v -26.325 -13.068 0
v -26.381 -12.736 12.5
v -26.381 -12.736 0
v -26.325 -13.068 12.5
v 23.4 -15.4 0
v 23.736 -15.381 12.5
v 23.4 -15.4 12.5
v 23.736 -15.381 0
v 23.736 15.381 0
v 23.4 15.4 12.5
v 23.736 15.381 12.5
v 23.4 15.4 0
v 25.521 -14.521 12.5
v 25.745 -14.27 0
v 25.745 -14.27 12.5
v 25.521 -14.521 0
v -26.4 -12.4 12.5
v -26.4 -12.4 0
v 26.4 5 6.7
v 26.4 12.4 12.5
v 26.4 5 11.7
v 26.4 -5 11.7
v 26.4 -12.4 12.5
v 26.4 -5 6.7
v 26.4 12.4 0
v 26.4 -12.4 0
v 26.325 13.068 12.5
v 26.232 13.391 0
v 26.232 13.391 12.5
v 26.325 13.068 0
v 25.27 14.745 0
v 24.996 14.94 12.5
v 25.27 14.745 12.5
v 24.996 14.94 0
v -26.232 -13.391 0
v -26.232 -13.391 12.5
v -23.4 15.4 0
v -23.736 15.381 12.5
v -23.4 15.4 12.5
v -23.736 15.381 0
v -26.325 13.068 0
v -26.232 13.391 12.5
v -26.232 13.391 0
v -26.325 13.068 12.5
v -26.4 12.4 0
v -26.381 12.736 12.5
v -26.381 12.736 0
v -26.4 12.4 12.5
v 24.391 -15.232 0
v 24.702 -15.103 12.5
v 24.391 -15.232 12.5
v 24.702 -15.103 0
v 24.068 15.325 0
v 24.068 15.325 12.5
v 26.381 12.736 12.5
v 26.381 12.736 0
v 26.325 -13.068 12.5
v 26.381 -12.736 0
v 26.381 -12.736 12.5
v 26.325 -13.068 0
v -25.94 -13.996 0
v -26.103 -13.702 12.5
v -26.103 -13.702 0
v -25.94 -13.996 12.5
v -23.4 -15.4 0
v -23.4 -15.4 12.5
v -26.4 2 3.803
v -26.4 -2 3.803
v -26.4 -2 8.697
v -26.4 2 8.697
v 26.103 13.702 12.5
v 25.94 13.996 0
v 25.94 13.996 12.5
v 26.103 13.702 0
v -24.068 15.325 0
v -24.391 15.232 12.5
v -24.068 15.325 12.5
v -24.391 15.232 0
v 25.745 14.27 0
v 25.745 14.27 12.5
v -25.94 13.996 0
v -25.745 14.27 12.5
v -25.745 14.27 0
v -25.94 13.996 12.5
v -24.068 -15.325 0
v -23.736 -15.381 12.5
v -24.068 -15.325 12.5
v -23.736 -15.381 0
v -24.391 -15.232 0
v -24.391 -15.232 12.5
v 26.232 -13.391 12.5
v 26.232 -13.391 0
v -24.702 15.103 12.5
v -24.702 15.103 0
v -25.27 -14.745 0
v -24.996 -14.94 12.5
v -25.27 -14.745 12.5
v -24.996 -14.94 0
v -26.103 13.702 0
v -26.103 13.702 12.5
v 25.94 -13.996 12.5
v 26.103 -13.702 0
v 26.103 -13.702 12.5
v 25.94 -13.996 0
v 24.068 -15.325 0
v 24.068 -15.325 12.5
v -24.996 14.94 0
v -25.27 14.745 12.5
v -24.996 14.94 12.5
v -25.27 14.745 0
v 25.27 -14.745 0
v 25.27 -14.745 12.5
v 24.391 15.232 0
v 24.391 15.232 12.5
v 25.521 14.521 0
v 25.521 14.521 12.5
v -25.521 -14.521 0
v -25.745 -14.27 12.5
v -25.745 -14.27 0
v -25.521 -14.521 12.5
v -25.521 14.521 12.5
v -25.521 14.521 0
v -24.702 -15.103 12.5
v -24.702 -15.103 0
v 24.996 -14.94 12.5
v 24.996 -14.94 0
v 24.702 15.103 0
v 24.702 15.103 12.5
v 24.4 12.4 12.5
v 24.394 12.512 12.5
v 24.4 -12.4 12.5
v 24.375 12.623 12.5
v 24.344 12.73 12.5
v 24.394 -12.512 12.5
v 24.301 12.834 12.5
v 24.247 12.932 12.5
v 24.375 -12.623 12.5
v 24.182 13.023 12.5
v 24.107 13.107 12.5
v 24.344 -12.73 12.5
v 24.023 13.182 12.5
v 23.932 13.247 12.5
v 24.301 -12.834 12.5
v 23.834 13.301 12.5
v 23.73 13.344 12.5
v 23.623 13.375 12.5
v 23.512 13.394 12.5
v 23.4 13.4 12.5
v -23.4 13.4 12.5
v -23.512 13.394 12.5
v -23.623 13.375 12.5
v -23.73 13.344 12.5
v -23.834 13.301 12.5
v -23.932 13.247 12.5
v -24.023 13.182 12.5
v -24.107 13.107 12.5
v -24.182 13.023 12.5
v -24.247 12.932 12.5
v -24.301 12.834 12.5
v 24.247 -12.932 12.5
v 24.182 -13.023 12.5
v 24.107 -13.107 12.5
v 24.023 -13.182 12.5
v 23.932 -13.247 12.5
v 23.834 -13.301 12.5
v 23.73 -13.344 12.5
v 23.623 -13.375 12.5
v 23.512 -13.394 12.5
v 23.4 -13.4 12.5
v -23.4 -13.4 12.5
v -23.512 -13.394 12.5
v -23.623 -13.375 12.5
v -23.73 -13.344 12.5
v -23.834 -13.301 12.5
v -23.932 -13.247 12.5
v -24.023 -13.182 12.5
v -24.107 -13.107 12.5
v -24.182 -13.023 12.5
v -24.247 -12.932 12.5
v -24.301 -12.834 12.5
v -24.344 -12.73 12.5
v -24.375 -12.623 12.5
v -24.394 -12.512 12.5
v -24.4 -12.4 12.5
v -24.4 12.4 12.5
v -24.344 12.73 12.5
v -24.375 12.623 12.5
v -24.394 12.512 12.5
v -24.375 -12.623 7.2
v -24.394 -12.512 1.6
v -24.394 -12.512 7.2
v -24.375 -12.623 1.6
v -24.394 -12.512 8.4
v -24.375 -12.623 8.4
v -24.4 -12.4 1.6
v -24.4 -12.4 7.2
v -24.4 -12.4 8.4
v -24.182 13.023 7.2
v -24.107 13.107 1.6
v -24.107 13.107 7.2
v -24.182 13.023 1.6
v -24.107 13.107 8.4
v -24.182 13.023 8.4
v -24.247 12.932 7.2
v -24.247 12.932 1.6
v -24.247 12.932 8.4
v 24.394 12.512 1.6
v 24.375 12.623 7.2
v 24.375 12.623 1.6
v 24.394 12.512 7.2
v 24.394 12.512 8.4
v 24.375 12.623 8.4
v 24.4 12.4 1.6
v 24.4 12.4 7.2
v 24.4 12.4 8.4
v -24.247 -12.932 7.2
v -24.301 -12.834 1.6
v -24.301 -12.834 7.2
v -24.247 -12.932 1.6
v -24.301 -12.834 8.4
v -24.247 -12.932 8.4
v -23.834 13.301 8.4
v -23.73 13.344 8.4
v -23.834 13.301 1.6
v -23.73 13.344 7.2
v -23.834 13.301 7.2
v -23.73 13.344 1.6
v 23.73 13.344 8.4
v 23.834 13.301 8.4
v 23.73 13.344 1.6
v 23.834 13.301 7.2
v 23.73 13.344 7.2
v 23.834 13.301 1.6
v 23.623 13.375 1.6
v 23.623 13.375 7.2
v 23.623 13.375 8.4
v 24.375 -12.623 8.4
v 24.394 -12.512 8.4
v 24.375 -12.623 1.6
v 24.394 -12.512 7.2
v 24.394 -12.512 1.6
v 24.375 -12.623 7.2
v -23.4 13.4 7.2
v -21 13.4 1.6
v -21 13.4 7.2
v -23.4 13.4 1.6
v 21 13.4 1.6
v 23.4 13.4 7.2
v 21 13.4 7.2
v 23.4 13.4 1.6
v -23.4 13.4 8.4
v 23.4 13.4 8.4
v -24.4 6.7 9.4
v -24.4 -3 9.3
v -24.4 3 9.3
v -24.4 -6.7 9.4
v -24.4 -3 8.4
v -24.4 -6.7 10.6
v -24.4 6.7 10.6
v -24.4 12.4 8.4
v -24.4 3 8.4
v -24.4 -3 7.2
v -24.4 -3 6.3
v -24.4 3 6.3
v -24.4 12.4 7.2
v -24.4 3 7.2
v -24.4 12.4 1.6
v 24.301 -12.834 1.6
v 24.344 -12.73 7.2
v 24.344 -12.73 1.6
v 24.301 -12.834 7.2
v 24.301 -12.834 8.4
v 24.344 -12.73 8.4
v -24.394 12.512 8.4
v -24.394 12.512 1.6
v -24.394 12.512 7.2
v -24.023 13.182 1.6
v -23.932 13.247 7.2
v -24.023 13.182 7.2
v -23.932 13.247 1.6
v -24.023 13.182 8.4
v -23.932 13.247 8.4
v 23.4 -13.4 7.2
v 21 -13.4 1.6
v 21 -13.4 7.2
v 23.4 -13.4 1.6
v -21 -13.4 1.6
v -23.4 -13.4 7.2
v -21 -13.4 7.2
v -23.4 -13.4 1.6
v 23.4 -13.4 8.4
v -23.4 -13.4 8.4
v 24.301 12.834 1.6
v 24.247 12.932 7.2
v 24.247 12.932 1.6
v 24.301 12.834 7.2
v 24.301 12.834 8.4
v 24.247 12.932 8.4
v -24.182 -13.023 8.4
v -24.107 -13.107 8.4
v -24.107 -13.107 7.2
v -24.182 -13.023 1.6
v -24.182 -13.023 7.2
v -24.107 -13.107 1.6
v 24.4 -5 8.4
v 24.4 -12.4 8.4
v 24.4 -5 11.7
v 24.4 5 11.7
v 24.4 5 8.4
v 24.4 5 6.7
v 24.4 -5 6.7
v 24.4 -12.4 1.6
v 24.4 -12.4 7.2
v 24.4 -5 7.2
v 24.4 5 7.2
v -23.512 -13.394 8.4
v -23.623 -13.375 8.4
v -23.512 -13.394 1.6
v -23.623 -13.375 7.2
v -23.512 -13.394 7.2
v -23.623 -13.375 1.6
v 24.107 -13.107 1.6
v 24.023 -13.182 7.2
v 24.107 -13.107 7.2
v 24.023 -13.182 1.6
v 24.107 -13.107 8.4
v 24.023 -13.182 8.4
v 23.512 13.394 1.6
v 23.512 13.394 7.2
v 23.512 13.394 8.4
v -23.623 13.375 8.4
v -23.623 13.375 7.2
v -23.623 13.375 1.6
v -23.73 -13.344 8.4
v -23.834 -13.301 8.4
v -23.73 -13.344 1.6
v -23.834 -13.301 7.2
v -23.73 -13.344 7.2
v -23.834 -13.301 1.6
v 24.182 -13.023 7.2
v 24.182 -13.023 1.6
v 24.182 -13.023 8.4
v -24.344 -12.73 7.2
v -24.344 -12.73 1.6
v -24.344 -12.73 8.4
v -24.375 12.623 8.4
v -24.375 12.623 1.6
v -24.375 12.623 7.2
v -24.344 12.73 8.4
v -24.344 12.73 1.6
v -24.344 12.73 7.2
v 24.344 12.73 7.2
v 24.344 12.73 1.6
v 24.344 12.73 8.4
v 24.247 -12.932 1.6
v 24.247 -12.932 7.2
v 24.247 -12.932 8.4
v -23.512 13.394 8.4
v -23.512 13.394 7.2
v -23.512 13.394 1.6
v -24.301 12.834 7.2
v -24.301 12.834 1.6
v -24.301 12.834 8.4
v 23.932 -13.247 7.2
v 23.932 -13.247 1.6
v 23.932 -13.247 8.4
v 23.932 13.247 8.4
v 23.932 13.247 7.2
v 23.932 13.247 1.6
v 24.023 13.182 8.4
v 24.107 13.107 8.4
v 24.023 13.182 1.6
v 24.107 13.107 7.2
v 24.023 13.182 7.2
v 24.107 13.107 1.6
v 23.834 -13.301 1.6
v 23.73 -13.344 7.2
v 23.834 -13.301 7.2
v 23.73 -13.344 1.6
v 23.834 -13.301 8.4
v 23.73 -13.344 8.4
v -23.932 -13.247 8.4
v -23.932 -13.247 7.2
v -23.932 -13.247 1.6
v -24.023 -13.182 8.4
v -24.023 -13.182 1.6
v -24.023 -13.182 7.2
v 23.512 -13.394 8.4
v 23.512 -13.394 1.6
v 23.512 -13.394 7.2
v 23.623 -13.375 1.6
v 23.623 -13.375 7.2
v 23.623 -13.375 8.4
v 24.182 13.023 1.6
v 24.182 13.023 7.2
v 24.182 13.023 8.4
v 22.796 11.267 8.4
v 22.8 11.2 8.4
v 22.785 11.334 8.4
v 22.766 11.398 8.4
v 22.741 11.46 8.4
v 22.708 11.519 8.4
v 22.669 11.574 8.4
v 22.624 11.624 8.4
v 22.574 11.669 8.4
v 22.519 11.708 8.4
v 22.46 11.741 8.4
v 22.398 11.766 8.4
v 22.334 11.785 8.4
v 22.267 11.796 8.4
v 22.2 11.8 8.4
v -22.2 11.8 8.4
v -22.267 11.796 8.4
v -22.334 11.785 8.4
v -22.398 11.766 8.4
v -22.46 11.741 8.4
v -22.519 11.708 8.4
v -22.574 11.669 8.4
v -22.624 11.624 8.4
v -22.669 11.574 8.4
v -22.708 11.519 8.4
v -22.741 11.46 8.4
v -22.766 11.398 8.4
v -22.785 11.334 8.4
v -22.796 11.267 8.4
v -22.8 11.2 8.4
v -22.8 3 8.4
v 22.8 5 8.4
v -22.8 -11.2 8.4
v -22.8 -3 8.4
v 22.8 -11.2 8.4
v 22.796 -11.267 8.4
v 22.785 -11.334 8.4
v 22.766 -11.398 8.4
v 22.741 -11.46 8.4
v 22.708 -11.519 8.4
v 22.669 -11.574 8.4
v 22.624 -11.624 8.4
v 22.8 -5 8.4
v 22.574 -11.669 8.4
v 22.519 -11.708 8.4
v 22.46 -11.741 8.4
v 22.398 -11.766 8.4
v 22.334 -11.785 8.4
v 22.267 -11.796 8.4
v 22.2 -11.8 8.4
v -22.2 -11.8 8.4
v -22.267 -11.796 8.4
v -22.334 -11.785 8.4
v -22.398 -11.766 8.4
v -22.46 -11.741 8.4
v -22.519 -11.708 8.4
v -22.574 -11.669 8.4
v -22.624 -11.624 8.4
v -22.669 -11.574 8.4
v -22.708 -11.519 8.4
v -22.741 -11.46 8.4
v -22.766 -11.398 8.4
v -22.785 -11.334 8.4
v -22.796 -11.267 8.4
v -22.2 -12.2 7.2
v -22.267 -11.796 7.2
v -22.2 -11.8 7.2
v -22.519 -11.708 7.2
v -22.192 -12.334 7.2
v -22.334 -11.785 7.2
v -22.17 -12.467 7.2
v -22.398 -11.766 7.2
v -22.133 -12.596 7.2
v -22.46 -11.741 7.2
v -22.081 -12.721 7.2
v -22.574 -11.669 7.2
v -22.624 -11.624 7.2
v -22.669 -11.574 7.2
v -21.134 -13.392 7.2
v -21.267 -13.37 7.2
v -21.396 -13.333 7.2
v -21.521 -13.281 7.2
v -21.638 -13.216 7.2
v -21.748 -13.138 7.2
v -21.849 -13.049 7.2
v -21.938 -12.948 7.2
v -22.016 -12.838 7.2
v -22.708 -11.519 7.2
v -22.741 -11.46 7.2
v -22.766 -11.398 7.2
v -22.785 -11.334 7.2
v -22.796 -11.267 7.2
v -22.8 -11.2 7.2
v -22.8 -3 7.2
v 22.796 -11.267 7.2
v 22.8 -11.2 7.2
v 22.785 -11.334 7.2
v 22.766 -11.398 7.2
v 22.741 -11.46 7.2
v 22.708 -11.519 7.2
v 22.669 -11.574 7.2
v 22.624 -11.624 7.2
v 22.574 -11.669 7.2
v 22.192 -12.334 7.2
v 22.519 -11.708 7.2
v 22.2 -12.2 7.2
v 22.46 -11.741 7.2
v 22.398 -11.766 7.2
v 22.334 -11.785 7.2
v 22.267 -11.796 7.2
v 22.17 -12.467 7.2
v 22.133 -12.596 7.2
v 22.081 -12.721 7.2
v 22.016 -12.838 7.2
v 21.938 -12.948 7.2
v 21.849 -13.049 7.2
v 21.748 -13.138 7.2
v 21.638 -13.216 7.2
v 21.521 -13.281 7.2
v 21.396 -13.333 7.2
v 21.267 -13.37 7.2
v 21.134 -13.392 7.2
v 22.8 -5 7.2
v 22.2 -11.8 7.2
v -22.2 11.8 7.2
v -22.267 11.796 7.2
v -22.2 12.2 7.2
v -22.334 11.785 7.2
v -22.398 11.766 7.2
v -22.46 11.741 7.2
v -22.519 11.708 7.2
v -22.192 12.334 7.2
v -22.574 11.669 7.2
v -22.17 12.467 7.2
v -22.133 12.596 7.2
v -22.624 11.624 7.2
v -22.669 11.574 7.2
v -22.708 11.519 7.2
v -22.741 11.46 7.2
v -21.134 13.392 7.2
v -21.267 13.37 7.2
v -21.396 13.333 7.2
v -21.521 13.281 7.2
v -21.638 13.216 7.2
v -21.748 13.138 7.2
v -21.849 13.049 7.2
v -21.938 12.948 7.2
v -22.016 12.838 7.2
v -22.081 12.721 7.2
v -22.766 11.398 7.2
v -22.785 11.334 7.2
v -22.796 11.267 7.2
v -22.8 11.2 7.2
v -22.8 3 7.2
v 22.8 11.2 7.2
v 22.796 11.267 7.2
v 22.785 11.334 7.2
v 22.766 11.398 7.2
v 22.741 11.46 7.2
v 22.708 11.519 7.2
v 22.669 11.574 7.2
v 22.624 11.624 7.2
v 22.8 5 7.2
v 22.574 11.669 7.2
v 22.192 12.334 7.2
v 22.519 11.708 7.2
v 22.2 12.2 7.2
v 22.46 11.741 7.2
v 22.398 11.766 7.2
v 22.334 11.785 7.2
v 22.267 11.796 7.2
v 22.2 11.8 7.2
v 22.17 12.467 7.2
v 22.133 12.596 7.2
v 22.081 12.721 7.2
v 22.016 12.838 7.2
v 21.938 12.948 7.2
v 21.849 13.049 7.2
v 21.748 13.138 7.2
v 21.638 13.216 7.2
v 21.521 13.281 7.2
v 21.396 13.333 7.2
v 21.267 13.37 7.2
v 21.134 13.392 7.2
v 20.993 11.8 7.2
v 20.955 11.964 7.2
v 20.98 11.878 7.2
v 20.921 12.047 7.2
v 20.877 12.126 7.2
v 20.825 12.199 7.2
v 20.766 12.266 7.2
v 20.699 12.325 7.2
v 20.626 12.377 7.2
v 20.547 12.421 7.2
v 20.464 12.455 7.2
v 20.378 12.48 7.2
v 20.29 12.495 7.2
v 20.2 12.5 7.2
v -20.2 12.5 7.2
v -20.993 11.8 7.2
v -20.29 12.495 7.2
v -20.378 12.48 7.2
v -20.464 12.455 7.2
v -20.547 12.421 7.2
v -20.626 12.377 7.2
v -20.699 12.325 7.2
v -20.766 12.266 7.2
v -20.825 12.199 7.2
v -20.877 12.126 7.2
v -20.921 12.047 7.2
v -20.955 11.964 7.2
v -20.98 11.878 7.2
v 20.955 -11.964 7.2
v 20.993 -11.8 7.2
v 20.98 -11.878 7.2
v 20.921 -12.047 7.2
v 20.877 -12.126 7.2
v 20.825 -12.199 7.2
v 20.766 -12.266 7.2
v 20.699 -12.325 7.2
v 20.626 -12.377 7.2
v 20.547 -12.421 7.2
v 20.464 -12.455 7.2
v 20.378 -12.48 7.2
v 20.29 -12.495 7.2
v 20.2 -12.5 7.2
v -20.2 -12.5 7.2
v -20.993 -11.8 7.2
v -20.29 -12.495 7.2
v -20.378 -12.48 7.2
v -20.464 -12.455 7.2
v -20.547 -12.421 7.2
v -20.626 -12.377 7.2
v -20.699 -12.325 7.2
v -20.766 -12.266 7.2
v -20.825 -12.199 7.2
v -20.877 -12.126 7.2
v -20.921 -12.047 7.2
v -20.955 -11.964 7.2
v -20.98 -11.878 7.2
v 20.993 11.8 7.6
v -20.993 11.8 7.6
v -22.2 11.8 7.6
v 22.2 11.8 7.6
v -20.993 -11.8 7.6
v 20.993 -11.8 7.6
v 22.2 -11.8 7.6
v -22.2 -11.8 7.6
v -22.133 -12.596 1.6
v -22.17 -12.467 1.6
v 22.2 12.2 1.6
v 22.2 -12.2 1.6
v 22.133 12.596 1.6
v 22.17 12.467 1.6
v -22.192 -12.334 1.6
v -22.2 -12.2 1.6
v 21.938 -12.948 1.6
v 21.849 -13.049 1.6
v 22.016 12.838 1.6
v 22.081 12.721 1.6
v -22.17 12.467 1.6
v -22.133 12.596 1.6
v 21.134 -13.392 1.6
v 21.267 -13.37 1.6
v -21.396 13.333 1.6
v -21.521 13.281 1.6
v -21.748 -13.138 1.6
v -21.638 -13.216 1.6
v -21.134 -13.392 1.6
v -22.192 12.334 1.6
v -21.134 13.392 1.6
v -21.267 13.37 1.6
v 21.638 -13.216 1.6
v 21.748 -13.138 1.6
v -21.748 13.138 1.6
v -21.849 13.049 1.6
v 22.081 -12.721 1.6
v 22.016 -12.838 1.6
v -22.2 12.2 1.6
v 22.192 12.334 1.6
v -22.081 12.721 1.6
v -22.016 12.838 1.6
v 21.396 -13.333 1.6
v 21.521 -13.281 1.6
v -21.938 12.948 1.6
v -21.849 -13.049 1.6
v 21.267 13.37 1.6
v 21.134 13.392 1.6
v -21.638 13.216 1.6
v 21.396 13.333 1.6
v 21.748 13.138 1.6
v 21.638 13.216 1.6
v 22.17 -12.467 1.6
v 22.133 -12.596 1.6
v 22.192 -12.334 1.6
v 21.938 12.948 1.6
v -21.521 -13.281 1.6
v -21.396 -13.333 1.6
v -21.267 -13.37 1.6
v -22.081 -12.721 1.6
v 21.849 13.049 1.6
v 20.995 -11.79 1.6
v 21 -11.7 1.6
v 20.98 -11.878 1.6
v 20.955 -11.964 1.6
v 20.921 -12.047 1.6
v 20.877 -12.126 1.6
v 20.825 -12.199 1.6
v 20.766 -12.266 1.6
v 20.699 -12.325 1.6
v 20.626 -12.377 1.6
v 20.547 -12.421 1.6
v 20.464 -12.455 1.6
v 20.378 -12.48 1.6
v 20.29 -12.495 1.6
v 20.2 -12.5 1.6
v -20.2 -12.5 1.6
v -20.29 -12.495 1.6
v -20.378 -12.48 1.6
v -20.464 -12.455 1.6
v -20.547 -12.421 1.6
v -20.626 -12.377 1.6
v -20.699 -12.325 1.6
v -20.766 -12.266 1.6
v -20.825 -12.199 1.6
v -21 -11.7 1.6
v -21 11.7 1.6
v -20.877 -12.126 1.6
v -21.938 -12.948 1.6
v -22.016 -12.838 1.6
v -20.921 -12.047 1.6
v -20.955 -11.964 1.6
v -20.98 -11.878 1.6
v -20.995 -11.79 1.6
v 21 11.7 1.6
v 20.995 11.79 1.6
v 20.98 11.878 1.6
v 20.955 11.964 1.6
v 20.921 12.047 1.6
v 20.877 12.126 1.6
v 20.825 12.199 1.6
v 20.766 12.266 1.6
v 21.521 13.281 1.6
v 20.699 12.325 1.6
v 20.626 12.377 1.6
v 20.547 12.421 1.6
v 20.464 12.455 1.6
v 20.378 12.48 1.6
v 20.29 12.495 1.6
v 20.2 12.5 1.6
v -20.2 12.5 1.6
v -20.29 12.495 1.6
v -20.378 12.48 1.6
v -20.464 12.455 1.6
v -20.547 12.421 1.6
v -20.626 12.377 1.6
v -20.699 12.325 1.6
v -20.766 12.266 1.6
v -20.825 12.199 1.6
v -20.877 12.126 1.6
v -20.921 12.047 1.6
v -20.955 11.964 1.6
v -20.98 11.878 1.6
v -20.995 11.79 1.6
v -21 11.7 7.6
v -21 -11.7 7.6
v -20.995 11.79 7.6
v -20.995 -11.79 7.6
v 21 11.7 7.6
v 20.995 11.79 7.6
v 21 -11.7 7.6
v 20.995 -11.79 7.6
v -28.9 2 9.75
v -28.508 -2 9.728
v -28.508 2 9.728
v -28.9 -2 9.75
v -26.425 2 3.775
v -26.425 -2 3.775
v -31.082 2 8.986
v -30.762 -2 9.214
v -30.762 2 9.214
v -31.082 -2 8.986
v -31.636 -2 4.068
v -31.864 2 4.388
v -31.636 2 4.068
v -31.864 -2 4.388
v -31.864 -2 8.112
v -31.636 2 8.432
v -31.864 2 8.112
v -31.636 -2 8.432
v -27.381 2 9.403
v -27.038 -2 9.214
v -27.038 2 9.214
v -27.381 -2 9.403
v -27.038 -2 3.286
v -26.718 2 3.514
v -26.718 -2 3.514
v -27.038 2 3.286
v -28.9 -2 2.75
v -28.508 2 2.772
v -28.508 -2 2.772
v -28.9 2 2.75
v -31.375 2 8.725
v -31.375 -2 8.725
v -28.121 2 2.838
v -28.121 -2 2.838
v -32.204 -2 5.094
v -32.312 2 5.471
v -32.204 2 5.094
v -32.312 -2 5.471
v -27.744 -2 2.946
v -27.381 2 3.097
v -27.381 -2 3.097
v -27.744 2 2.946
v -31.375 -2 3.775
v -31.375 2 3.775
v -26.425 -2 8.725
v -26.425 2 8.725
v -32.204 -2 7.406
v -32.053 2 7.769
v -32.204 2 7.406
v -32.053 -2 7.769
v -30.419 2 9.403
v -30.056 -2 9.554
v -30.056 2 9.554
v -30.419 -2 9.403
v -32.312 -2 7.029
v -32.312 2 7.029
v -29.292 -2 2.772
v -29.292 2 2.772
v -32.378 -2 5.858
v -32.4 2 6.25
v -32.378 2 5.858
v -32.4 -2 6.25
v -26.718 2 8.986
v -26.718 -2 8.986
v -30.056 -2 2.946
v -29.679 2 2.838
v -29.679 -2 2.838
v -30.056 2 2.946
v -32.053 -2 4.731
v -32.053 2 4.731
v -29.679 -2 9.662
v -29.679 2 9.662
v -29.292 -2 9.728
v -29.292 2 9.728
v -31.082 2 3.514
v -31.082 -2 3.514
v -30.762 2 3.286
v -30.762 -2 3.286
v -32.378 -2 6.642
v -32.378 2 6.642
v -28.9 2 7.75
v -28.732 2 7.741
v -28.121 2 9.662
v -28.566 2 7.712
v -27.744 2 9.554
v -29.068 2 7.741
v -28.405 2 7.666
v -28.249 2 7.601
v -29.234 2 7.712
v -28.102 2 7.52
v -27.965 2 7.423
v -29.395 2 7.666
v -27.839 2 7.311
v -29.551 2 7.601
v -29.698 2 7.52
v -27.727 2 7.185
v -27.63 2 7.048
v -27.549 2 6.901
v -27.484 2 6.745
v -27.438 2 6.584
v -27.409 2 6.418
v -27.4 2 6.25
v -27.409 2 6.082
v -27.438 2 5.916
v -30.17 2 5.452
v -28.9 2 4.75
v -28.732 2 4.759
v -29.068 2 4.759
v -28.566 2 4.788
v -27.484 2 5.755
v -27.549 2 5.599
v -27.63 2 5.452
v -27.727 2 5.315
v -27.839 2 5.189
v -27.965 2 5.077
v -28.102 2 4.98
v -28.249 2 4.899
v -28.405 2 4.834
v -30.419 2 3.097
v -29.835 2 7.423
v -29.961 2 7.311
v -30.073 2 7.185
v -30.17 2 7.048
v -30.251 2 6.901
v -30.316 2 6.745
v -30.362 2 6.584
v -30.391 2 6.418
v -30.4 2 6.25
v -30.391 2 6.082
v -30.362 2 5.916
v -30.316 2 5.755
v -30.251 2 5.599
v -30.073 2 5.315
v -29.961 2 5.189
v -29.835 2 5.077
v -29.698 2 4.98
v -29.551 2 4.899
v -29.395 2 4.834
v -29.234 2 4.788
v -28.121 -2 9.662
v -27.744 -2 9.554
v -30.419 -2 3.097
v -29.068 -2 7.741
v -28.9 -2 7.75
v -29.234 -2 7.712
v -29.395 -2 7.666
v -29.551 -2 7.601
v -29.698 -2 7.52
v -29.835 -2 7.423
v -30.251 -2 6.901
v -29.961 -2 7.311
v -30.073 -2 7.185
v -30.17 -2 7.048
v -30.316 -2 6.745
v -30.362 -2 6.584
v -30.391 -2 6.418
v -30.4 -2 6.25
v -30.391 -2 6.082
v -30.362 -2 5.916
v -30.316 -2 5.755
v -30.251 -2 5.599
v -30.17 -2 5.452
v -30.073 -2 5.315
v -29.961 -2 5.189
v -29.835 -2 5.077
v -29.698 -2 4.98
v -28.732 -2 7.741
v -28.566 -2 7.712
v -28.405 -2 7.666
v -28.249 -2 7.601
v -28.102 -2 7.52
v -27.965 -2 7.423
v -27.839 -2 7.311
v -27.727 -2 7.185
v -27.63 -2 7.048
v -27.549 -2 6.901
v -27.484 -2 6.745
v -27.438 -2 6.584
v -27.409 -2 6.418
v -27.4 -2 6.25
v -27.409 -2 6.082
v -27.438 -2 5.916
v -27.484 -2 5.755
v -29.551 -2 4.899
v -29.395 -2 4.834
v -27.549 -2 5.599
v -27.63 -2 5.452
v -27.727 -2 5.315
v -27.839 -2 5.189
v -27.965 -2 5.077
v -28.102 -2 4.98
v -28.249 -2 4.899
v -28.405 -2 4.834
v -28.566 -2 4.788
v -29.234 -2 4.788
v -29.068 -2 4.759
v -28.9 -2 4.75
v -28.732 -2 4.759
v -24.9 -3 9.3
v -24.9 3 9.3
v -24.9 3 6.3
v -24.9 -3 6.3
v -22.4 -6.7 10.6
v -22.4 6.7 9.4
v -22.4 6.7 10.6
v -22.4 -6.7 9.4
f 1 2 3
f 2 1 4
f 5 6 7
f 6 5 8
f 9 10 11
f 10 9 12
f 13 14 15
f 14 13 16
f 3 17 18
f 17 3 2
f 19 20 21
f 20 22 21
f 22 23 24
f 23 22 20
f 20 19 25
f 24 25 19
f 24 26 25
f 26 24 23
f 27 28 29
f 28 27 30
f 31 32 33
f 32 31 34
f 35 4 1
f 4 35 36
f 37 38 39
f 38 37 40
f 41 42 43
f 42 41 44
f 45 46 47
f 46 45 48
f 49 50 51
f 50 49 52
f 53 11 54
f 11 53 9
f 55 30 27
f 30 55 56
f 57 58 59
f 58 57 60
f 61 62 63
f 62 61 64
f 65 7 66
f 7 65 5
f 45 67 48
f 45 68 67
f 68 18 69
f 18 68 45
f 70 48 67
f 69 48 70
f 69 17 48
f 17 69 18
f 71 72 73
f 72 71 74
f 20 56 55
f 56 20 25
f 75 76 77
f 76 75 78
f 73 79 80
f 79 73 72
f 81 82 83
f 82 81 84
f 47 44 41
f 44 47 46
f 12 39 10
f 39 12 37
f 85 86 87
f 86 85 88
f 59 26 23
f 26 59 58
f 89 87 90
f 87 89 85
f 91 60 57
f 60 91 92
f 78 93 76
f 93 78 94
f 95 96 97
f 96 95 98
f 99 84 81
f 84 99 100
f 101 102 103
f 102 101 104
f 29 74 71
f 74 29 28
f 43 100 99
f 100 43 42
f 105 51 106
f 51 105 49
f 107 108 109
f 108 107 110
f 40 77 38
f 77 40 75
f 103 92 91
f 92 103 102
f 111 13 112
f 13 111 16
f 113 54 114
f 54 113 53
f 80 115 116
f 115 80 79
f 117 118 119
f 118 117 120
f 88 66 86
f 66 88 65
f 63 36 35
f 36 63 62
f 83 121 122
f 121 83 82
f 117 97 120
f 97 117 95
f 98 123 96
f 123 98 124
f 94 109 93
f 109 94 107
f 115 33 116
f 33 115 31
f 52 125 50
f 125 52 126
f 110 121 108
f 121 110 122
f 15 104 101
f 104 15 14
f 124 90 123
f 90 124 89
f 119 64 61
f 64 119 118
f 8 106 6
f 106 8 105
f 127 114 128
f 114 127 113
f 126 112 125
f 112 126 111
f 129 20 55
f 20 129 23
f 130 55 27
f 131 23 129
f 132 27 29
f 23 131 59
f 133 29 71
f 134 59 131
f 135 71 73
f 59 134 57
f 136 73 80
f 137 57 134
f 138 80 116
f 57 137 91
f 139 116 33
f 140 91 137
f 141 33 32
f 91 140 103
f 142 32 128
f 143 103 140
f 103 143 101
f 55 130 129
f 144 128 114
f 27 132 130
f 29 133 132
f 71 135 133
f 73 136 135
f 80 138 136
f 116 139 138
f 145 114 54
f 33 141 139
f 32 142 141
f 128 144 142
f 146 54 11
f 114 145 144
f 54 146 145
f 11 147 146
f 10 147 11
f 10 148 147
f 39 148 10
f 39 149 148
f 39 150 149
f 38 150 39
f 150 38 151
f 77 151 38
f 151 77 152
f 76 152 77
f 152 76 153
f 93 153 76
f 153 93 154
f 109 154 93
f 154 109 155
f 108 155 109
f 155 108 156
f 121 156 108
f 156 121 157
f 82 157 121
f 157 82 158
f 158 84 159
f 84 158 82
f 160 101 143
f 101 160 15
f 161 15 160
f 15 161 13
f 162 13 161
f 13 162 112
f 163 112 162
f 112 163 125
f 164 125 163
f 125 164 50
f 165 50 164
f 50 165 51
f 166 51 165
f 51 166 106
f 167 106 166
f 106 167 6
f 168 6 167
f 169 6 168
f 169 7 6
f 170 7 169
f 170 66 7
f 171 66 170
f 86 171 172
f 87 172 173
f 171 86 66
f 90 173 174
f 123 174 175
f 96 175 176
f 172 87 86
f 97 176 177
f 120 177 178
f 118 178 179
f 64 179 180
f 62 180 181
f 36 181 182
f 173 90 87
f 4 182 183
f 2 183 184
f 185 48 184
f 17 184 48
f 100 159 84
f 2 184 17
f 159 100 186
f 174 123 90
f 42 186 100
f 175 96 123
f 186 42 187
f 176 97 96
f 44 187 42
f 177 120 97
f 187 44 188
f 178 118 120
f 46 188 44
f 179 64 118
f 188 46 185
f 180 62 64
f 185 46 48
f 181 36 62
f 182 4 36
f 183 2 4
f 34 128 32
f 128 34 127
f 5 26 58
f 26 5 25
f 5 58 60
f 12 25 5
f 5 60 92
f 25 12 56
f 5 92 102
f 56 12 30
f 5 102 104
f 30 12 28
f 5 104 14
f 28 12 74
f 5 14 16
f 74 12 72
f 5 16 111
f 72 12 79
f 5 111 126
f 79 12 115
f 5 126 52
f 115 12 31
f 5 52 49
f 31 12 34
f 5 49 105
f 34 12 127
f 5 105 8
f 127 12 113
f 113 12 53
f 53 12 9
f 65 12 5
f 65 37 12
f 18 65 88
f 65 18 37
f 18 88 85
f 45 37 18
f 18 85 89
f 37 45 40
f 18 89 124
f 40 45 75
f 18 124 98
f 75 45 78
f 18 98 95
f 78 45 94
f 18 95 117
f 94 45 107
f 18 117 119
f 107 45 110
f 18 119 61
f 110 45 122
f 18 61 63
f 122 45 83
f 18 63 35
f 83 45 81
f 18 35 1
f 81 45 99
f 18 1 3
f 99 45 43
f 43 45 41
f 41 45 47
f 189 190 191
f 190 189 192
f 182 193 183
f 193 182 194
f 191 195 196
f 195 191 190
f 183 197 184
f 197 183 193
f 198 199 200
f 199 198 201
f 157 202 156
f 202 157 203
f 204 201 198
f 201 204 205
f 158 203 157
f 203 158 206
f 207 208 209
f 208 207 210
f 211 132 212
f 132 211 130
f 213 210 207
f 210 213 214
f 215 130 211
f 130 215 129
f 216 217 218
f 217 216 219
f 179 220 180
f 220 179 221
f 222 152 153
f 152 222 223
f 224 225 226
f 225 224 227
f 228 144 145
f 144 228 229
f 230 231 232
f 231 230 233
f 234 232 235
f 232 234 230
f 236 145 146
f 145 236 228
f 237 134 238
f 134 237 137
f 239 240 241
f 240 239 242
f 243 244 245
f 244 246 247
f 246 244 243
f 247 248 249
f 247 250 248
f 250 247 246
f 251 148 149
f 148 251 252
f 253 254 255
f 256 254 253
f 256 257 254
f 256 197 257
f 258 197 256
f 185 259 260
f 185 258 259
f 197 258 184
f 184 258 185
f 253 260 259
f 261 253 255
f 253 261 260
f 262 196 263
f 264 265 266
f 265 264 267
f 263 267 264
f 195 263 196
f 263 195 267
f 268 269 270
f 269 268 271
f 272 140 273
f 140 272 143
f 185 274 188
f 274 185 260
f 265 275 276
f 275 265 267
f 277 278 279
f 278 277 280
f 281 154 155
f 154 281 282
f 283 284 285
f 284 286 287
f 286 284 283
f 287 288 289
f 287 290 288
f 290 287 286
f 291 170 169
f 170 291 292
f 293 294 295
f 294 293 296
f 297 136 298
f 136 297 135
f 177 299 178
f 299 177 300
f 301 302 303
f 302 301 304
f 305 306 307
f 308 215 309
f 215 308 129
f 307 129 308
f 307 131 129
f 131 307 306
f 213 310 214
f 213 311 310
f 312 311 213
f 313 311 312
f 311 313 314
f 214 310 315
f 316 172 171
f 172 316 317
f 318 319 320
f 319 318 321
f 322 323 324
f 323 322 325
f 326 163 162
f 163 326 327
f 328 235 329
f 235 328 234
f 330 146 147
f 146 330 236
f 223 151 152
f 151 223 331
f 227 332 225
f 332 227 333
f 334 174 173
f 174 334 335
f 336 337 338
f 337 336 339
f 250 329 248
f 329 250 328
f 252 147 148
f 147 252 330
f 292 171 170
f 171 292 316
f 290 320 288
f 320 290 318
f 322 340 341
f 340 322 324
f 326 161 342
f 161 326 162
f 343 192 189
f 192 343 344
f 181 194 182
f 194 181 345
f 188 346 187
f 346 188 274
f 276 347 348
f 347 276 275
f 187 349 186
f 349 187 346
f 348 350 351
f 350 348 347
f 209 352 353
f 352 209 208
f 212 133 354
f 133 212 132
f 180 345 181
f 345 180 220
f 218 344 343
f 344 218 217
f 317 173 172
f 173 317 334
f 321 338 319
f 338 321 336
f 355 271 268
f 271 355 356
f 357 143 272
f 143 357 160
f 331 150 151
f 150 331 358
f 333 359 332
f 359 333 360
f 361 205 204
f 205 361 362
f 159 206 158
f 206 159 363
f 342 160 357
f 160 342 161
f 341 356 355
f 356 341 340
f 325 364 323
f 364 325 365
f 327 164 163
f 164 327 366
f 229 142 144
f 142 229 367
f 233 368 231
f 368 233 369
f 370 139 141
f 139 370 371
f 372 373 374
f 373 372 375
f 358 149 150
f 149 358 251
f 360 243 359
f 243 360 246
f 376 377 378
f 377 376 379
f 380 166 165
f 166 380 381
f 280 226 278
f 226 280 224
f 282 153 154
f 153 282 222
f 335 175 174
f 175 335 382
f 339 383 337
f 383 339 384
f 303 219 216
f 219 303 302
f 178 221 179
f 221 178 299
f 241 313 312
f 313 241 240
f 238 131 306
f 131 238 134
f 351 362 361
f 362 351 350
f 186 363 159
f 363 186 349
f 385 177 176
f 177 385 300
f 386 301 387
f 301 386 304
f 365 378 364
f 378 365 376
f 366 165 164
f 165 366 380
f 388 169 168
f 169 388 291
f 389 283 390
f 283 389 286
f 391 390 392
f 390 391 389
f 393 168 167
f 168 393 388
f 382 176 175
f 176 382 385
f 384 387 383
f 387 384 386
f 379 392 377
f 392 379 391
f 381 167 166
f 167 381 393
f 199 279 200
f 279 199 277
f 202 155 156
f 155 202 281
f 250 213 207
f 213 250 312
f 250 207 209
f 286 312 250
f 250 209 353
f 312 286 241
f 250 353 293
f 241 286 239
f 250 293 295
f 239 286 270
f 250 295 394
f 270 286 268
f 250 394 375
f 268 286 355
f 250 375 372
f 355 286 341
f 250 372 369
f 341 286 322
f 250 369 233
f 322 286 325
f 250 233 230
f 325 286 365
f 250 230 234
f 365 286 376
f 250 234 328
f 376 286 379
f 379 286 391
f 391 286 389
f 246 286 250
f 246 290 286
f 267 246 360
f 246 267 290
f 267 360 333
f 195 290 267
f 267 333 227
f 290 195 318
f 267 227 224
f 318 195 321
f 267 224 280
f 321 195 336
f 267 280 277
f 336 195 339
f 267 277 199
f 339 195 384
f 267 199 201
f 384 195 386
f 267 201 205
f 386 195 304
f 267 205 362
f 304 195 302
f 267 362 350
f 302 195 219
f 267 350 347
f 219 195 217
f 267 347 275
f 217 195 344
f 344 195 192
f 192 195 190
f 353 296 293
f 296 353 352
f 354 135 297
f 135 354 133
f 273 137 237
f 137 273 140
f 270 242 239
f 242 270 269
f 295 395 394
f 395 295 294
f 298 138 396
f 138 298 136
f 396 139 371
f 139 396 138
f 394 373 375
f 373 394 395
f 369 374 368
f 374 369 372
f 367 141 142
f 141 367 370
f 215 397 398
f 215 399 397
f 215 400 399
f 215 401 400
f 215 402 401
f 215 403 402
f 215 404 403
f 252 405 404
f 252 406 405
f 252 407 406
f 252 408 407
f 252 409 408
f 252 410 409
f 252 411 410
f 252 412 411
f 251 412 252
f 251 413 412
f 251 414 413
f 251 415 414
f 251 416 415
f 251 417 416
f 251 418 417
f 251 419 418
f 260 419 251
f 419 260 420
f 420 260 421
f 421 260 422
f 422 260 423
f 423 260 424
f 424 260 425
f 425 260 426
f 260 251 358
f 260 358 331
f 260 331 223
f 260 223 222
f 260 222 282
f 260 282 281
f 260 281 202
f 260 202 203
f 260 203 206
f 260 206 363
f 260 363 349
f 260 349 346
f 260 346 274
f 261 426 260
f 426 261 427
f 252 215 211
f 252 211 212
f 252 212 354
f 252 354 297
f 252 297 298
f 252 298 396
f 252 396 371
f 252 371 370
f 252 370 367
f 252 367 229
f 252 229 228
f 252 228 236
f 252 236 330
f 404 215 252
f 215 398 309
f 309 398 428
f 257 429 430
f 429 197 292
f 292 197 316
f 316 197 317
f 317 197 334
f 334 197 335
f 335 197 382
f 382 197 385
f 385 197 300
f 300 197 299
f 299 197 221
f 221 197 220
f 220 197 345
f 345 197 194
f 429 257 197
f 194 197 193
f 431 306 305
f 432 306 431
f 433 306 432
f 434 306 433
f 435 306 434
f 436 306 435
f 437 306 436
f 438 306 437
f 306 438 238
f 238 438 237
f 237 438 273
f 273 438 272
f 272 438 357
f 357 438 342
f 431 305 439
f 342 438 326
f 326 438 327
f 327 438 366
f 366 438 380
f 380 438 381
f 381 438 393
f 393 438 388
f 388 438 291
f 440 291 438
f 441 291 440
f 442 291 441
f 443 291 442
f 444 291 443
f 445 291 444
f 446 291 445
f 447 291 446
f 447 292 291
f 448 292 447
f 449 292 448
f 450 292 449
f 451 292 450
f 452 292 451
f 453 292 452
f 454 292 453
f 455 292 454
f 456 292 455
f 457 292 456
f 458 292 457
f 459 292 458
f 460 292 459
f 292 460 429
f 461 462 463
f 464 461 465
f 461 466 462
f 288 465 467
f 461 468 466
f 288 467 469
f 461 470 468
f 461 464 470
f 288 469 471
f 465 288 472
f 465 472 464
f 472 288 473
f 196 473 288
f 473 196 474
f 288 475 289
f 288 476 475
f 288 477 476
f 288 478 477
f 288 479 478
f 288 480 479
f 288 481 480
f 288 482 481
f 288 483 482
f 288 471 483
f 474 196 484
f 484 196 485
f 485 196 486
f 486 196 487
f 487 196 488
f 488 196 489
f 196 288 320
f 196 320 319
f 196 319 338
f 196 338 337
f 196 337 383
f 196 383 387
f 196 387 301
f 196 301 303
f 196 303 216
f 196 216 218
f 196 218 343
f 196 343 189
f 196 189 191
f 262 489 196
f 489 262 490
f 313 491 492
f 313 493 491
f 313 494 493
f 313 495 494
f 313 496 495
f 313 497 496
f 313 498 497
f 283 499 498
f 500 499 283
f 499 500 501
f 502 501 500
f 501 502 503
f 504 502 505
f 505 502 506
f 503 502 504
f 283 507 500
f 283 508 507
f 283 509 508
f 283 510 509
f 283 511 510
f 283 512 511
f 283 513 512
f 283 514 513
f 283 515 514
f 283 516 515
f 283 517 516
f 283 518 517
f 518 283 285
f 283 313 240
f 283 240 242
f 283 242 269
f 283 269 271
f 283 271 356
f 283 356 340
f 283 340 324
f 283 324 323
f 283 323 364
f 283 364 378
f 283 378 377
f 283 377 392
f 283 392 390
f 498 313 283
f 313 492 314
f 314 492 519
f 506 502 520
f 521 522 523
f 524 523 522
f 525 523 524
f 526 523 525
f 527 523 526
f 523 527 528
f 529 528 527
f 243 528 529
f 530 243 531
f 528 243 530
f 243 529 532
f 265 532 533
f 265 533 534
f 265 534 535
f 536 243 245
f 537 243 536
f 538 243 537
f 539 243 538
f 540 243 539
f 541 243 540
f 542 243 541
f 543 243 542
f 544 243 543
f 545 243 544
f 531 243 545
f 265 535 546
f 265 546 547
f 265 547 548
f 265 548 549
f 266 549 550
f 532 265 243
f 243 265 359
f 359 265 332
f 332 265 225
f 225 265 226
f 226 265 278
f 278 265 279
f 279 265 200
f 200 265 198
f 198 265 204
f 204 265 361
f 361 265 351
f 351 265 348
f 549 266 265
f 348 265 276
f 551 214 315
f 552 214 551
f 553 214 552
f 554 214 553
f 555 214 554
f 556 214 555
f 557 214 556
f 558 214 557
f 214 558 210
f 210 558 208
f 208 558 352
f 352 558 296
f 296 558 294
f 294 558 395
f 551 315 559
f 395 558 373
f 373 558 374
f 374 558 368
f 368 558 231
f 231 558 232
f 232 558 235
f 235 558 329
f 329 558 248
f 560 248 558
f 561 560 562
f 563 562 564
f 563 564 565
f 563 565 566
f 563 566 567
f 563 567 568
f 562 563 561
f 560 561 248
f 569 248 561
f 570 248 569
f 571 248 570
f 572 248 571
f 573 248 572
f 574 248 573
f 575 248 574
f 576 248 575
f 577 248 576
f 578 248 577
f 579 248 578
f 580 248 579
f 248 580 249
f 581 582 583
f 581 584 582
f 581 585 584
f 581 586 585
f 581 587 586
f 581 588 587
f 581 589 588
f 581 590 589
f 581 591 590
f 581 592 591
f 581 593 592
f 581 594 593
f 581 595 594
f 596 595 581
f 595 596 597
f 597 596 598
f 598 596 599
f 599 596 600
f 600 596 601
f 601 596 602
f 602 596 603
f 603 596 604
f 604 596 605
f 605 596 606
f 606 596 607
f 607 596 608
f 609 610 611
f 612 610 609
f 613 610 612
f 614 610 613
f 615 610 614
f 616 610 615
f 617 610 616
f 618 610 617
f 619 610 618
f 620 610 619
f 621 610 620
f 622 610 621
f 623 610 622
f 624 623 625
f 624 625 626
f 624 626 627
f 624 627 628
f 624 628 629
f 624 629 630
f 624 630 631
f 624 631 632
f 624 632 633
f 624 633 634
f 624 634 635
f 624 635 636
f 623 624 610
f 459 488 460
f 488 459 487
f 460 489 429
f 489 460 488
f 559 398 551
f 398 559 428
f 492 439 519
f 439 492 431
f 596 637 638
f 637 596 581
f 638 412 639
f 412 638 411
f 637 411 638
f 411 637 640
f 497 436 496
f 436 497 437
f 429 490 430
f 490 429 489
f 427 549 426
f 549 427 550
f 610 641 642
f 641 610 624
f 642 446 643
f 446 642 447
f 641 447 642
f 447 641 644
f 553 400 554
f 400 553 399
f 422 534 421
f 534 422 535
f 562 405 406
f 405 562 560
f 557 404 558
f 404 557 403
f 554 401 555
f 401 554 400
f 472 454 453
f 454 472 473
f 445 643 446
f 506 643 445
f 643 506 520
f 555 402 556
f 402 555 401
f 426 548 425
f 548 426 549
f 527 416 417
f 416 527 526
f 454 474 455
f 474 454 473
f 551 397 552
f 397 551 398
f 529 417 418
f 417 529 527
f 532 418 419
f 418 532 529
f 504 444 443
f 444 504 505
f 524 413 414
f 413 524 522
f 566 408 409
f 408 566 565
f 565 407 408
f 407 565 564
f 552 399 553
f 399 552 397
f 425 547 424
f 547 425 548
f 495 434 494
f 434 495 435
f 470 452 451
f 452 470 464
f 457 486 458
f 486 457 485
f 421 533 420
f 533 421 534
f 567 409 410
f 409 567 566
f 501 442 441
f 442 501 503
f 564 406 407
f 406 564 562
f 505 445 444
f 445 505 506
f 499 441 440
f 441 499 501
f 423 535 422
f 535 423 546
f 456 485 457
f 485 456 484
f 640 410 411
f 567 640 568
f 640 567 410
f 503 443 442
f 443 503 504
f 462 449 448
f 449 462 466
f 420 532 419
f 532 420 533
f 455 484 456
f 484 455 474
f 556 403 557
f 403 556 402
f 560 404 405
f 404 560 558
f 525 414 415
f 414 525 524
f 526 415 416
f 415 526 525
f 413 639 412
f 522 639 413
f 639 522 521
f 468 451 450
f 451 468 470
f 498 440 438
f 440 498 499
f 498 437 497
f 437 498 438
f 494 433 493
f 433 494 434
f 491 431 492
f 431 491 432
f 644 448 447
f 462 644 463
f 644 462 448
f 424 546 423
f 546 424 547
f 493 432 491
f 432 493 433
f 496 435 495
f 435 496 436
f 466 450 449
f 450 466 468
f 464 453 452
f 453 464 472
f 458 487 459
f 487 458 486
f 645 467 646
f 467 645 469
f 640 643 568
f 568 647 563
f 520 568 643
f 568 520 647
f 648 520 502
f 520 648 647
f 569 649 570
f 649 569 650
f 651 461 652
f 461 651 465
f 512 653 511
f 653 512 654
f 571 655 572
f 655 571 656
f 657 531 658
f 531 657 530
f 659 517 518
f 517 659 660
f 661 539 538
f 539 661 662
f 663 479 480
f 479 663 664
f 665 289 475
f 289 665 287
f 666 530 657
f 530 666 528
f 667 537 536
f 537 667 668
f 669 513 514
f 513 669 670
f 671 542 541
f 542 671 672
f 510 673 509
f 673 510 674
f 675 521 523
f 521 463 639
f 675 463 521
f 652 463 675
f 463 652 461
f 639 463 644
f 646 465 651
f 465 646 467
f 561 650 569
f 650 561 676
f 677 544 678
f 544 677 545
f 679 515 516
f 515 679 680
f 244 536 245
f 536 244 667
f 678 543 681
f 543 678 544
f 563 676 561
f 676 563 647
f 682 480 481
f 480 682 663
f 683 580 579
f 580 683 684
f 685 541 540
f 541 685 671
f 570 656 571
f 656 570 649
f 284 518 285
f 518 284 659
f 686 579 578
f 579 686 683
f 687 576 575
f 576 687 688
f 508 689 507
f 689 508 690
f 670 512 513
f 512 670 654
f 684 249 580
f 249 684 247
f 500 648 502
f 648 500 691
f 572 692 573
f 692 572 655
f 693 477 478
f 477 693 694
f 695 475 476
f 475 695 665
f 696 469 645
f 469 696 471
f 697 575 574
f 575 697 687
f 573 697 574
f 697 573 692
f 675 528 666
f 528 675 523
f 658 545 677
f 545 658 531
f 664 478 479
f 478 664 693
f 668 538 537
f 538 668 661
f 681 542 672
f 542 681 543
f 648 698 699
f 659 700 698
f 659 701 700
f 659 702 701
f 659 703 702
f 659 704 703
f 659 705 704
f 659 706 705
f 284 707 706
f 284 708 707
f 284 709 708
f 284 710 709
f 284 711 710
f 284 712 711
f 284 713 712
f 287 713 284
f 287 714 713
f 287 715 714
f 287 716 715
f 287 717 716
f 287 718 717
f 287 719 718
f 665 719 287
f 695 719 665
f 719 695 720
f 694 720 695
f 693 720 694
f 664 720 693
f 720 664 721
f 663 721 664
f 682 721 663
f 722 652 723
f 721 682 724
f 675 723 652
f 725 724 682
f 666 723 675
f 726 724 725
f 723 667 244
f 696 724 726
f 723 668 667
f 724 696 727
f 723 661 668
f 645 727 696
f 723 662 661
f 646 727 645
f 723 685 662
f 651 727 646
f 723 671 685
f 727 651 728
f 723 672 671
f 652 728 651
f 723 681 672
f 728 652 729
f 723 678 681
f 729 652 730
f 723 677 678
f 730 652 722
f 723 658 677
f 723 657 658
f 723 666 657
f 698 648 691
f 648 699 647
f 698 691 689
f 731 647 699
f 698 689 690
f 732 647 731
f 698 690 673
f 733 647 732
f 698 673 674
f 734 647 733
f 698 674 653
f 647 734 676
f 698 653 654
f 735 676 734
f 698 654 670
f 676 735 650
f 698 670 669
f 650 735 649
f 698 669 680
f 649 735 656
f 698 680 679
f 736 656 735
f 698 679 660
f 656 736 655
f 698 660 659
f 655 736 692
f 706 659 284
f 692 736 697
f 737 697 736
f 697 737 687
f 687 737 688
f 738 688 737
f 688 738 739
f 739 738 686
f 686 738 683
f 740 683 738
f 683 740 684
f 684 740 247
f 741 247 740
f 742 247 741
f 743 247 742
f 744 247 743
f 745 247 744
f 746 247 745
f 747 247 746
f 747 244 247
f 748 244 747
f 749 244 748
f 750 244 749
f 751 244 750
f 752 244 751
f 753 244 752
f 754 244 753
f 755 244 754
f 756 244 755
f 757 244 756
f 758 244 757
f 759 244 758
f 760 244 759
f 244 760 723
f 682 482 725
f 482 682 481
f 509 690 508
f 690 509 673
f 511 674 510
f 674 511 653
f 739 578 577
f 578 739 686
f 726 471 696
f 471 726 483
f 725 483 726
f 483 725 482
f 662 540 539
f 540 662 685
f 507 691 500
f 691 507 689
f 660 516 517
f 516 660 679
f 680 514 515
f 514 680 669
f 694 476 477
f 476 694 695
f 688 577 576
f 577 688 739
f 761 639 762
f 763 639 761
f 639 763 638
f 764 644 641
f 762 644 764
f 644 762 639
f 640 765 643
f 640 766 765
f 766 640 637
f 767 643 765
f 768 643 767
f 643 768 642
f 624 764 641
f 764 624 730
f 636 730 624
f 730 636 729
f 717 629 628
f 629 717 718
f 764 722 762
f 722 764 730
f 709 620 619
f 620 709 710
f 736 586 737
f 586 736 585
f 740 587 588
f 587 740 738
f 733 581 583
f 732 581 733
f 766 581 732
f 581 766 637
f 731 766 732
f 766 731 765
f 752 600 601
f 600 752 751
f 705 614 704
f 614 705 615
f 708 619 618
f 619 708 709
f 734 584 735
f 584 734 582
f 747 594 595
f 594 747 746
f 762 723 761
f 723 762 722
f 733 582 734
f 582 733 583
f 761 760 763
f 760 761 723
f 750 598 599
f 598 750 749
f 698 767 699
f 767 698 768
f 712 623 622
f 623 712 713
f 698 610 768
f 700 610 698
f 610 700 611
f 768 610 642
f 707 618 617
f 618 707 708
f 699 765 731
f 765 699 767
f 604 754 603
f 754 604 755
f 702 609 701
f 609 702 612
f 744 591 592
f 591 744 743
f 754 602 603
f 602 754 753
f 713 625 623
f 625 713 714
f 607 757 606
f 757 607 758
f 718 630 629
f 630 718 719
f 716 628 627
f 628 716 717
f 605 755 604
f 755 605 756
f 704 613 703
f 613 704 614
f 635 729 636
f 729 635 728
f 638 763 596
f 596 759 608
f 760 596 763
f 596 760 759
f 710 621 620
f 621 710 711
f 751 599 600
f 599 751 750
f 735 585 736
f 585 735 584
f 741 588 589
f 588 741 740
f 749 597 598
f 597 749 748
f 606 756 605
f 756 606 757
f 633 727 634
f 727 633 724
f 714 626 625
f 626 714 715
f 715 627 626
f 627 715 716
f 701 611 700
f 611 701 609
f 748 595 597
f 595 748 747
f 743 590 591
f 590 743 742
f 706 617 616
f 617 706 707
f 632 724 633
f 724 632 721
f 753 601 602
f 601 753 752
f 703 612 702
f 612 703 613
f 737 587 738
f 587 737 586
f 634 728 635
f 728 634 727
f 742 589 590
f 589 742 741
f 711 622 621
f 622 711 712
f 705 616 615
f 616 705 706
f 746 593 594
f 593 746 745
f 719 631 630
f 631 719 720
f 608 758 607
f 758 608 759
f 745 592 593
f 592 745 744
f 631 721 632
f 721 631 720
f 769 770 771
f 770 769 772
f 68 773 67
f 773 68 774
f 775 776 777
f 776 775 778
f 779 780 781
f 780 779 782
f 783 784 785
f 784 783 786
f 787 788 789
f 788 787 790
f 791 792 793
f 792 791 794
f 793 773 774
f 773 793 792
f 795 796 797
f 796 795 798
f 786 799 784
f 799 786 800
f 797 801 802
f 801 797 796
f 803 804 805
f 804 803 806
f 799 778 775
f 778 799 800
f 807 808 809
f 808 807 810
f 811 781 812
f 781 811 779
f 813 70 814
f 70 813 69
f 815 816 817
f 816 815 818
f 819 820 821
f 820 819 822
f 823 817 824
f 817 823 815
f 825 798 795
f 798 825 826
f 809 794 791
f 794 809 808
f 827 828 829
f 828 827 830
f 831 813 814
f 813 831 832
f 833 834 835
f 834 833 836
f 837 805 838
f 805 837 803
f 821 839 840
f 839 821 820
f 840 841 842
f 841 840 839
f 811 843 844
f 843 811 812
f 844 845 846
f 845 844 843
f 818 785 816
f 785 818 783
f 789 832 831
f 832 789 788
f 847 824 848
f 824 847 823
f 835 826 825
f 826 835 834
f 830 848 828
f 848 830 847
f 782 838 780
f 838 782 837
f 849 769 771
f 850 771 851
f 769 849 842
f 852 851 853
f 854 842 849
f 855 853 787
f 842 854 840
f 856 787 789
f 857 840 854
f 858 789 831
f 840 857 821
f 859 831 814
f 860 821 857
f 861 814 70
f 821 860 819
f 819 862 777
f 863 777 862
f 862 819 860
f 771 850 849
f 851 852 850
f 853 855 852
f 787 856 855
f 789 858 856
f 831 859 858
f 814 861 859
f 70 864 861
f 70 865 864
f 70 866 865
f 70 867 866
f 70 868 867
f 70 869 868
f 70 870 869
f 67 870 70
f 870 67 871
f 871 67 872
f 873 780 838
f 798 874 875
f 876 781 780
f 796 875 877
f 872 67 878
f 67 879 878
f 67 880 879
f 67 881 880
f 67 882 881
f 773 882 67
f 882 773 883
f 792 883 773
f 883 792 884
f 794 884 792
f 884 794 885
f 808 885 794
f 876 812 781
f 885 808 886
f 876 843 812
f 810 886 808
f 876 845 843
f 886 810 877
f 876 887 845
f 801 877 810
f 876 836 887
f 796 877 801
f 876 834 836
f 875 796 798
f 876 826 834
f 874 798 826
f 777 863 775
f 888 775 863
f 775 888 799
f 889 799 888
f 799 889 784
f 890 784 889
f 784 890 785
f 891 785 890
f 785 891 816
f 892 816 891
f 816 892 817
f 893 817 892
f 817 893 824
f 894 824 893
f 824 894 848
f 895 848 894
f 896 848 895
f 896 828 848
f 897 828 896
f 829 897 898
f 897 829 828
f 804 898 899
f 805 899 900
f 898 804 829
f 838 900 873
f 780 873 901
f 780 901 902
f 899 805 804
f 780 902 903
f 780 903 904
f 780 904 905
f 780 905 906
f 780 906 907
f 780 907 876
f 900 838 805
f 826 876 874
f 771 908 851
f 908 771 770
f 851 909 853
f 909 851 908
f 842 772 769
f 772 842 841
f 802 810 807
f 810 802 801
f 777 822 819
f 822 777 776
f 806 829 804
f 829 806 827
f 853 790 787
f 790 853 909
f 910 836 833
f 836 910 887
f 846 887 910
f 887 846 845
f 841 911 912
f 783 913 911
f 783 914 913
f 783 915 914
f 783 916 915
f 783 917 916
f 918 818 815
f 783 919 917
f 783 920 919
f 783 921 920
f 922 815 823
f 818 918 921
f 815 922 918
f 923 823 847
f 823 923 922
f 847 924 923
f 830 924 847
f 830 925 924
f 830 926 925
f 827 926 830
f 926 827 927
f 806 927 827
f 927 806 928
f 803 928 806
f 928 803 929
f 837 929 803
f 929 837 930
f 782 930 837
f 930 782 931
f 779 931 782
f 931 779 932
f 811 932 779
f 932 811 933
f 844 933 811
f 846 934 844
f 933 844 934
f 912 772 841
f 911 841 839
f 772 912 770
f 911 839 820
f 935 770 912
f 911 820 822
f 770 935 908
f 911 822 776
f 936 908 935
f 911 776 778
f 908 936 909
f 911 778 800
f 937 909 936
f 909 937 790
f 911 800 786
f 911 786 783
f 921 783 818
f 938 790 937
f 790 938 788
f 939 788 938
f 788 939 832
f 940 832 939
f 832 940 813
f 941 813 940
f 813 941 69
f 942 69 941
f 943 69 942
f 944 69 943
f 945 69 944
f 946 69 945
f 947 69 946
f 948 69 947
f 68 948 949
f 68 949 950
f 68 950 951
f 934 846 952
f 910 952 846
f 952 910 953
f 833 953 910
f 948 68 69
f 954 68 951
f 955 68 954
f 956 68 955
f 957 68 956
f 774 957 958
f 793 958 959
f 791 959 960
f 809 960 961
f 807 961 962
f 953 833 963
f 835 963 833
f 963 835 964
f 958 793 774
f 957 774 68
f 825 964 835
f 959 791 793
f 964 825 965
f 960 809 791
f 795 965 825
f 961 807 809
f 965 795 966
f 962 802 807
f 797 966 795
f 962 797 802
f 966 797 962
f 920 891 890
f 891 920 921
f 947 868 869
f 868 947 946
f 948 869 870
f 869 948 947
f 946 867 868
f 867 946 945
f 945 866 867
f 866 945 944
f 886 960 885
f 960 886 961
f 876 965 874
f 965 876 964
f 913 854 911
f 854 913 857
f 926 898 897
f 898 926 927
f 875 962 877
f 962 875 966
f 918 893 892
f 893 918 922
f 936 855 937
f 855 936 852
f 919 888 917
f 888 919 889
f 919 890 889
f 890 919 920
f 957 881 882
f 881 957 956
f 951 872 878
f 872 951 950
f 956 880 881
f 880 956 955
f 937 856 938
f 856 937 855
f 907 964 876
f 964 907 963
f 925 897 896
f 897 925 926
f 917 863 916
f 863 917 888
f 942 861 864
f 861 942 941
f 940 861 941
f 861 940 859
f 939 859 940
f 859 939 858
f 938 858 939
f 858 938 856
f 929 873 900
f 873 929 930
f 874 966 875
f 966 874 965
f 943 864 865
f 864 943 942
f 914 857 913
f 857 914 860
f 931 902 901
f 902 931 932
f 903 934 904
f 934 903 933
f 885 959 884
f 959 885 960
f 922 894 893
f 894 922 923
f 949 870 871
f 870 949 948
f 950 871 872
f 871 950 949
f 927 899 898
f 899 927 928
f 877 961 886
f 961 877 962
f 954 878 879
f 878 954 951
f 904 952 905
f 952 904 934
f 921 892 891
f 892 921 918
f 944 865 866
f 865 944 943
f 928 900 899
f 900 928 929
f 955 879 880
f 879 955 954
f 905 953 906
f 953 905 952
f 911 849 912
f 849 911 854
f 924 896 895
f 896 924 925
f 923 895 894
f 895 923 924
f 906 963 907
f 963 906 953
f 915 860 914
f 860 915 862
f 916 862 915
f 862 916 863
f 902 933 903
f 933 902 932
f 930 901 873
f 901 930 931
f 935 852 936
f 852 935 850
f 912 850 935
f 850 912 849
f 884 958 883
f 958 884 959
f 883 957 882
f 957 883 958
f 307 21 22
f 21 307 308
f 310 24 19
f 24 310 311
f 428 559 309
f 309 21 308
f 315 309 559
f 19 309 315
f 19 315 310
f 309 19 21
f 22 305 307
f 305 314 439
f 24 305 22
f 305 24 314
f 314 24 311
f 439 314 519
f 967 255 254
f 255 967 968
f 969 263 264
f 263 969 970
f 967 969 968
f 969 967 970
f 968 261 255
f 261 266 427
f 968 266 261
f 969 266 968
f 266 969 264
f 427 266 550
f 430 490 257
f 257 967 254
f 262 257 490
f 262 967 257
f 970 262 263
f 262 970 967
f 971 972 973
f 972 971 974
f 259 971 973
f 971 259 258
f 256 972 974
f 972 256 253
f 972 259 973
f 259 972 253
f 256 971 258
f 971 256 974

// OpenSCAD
// ============================================================================
// XIAO ESP32-S3 Plus 1.14" 화면 일체형 보드용 하우징 (크래들 방식)
//
// 이 보드는 화면·버튼 3개·USB-C가 모두 보드에 붙어 있고, 정확한 위치가
// 공개돼 있지 않습니다. 그래서 "앞면(화면·버튼)을 통째로 열어 둔" 받침 구조로
// 설계했습니다 → 내부 부품 위치를 몰라도 화면은 보이고 버튼은 눌리고 USB는 꽂힙니다.
//
//   [뚜껑/프레임 없음]  화면·버튼 = 열린 윗면으로 노출
//   보드 ── 아래 선반에 안착
//   배터리 ── 보드 밑 칸
//   USB-C ── 한쪽 짧은 벽의 슬롯 (usb_end 로 위치 선택)
//
// 보드 크기는 Seeed 위키 "Board Size 26 x 48 x 10.6mm" 기준.
// 실측 후 숫자만 맞추세요. 단위 mm.
//
// 렌더:  part="tray"(받침, 프린트) | "preview"(보드/배터리 유령 포함)
// ============================================================================

part = "tray";
$fn = 56;

// ---------------- 보드 ----------------
board_l = 48.0;   // 긴 변 (X)
board_w = 26.0;   // 짧은 변 (Y)
board_th = 1.6;   // PCB 두께(선반이 받치는 부분). 전체 10.6은 화면+USB 포함값
pcb_fit = 0.4;    // 보드 XY 끼움 여유

// USB-C 위치: 어느 짧은 벽에 둘지. "x+"=긴 변 +X 끝, "x-"=반대 끝
usb_end = "x+";
usb_w = 10.0;     // 슬롯 폭(케이블 몰딩 여유 포함)
usb_h = 5.0;      // 슬롯 높이
usb_z_off = 0.0;  // 보드 윗면 기준 USB 중심 높이 보정(+면 위로)

// ---------------- 배터리 (보드 밑 칸) ----------------
bat_l = 42.0;     // X (503040 기준; 보드보다 짧게)
bat_w = 25.0;     // Y
bat_h = 6.0;      // Z (여유 포함)

// ---------------- 케이스 ----------------
wall = 2.0;
floor_th = 1.6;
shelf = 1.6;        // 보드를 받치는 선반 폭(안쪽으로)
wall_above = 2.5;   // 보드 윗면보다 벽을 얼마나 더 올릴지(화면 보호 테두리)
corner_r = 3.0;
retain = true;      // USB 반대쪽 끝에 보드 눌림방지 턱
lanyard = true;     // 끈 구멍 러그

// ---------------- 계산 ----------------
cav_l = board_l + 2*pcb_fit;      // 보드 수용 X
cav_w = board_w + 2*pcb_fit;      // 보드 수용 Y
inner_l = cav_l;
inner_w = cav_w;
board_z = floor_th + bat_h + 0.8; // 보드 밑면 높이(배터리 위)
top_z = board_z + board_th + wall_above;  // 벽 높이
out_l = inner_l + 2*wall;
out_w = inner_w + 2*wall;

module rrect(x,y,r){ hull() for(sx=[-1,1],sy=[-1,1]) translate([sx*(x/2-r),sy*(y/2-r)]) circle(r); }
module rbox(x,y,z,r){ linear_extrude(z) rrect(x,y,r); }

module tray(){
  difference(){
    union(){
      // 바깥 몸통
      difference(){
        rbox(out_l, out_w, top_z, corner_r);
        // 전체 안쪽을 파냄(윗면 열림)
        translate([0,0,floor_th]) rbox(inner_l, inner_w, top_z, max(corner_r-wall,0.6));
      }
      // 보드 선반: 안쪽 둘레에서 shelf 만큼 안으로, board_z 높이에 턱
      translate([0,0,board_z-1.2]) difference(){
        rbox(inner_l, inner_w, 1.2, max(corner_r-wall,0.6));
        translate([0,0,-0.1]) rbox(inner_l-2*shelf, inner_w-2*shelf, 1.4, 0.6);
      }
      // 배터리 칸 측벽(선반 아래 공간을 배터리 크기로 가이드)
      translate([0,0,floor_th]) difference(){
        rbox(min(bat_l+2.4,inner_l), min(bat_w+2.4,inner_w), bat_h, 1.2);
        translate([0,0,-0.1]) rbox(bat_l, bat_w, bat_h+0.2, 0.8);
      }
      // 끈 러그
      if(lanyard)
        translate([-out_l/2-2.5, 0, top_z/2]) difference(){
          rotate([90,0,0]) cylinder(d=7, h=4, center=true);
          rotate([90,0,0]) cylinder(d=3, h=5, center=true);
        }
    }
    // USB-C 슬롯
    ux = (usb_end=="x-") ? -1 : 1;
    translate([ux*(out_l/2 - wall/2), 0, board_z + board_th/2 + usb_z_off])
      cube([wall*3, usb_w, usb_h], center=true);
    // 배터리 선 통과(선반에 홈)
    translate([0, 0, board_z-0.6]) rotate([0,0,0])
      translate([ -ux*(inner_l/2 - shelf/2), 0, 0]) cube([shelf+1, 6, 3], center=true);
  }
  // 보드 눌림 방지 턱(USB 반대쪽 짧은 끝, 버튼 없는 쪽). 안쪽으로 살짝 덮음
  if(retain){
    ux = (usb_end=="x-") ? -1 : 1;
    translate([-ux*(inner_l/2 - 1.0), 0, board_z + board_th])
      cube([2.0, inner_w*0.5, 1.2], center=true);
  }
}

module preview(){
  color("DimGray") tray();
  // 배터리
  color([1,0,0,0.35]) translate([-bat_l/2,-bat_w/2,floor_th]) cube([bat_l,bat_w,bat_h]);
  // 보드
  color([0.1,0.3,0.8,0.5]) translate([-board_l/2,-board_w/2,board_z]) cube([board_l,board_w,board_th]);
  // 화면(보드 위, 열린 윗면으로 노출) — 대략 중앙
  color([0.1,0.1,0.1,0.8]) translate([-25.3/2, -14.2/2, board_z+board_th]) cube([25.3,14.2,1.5]);
}

if(part=="preview") preview();
else tray();
